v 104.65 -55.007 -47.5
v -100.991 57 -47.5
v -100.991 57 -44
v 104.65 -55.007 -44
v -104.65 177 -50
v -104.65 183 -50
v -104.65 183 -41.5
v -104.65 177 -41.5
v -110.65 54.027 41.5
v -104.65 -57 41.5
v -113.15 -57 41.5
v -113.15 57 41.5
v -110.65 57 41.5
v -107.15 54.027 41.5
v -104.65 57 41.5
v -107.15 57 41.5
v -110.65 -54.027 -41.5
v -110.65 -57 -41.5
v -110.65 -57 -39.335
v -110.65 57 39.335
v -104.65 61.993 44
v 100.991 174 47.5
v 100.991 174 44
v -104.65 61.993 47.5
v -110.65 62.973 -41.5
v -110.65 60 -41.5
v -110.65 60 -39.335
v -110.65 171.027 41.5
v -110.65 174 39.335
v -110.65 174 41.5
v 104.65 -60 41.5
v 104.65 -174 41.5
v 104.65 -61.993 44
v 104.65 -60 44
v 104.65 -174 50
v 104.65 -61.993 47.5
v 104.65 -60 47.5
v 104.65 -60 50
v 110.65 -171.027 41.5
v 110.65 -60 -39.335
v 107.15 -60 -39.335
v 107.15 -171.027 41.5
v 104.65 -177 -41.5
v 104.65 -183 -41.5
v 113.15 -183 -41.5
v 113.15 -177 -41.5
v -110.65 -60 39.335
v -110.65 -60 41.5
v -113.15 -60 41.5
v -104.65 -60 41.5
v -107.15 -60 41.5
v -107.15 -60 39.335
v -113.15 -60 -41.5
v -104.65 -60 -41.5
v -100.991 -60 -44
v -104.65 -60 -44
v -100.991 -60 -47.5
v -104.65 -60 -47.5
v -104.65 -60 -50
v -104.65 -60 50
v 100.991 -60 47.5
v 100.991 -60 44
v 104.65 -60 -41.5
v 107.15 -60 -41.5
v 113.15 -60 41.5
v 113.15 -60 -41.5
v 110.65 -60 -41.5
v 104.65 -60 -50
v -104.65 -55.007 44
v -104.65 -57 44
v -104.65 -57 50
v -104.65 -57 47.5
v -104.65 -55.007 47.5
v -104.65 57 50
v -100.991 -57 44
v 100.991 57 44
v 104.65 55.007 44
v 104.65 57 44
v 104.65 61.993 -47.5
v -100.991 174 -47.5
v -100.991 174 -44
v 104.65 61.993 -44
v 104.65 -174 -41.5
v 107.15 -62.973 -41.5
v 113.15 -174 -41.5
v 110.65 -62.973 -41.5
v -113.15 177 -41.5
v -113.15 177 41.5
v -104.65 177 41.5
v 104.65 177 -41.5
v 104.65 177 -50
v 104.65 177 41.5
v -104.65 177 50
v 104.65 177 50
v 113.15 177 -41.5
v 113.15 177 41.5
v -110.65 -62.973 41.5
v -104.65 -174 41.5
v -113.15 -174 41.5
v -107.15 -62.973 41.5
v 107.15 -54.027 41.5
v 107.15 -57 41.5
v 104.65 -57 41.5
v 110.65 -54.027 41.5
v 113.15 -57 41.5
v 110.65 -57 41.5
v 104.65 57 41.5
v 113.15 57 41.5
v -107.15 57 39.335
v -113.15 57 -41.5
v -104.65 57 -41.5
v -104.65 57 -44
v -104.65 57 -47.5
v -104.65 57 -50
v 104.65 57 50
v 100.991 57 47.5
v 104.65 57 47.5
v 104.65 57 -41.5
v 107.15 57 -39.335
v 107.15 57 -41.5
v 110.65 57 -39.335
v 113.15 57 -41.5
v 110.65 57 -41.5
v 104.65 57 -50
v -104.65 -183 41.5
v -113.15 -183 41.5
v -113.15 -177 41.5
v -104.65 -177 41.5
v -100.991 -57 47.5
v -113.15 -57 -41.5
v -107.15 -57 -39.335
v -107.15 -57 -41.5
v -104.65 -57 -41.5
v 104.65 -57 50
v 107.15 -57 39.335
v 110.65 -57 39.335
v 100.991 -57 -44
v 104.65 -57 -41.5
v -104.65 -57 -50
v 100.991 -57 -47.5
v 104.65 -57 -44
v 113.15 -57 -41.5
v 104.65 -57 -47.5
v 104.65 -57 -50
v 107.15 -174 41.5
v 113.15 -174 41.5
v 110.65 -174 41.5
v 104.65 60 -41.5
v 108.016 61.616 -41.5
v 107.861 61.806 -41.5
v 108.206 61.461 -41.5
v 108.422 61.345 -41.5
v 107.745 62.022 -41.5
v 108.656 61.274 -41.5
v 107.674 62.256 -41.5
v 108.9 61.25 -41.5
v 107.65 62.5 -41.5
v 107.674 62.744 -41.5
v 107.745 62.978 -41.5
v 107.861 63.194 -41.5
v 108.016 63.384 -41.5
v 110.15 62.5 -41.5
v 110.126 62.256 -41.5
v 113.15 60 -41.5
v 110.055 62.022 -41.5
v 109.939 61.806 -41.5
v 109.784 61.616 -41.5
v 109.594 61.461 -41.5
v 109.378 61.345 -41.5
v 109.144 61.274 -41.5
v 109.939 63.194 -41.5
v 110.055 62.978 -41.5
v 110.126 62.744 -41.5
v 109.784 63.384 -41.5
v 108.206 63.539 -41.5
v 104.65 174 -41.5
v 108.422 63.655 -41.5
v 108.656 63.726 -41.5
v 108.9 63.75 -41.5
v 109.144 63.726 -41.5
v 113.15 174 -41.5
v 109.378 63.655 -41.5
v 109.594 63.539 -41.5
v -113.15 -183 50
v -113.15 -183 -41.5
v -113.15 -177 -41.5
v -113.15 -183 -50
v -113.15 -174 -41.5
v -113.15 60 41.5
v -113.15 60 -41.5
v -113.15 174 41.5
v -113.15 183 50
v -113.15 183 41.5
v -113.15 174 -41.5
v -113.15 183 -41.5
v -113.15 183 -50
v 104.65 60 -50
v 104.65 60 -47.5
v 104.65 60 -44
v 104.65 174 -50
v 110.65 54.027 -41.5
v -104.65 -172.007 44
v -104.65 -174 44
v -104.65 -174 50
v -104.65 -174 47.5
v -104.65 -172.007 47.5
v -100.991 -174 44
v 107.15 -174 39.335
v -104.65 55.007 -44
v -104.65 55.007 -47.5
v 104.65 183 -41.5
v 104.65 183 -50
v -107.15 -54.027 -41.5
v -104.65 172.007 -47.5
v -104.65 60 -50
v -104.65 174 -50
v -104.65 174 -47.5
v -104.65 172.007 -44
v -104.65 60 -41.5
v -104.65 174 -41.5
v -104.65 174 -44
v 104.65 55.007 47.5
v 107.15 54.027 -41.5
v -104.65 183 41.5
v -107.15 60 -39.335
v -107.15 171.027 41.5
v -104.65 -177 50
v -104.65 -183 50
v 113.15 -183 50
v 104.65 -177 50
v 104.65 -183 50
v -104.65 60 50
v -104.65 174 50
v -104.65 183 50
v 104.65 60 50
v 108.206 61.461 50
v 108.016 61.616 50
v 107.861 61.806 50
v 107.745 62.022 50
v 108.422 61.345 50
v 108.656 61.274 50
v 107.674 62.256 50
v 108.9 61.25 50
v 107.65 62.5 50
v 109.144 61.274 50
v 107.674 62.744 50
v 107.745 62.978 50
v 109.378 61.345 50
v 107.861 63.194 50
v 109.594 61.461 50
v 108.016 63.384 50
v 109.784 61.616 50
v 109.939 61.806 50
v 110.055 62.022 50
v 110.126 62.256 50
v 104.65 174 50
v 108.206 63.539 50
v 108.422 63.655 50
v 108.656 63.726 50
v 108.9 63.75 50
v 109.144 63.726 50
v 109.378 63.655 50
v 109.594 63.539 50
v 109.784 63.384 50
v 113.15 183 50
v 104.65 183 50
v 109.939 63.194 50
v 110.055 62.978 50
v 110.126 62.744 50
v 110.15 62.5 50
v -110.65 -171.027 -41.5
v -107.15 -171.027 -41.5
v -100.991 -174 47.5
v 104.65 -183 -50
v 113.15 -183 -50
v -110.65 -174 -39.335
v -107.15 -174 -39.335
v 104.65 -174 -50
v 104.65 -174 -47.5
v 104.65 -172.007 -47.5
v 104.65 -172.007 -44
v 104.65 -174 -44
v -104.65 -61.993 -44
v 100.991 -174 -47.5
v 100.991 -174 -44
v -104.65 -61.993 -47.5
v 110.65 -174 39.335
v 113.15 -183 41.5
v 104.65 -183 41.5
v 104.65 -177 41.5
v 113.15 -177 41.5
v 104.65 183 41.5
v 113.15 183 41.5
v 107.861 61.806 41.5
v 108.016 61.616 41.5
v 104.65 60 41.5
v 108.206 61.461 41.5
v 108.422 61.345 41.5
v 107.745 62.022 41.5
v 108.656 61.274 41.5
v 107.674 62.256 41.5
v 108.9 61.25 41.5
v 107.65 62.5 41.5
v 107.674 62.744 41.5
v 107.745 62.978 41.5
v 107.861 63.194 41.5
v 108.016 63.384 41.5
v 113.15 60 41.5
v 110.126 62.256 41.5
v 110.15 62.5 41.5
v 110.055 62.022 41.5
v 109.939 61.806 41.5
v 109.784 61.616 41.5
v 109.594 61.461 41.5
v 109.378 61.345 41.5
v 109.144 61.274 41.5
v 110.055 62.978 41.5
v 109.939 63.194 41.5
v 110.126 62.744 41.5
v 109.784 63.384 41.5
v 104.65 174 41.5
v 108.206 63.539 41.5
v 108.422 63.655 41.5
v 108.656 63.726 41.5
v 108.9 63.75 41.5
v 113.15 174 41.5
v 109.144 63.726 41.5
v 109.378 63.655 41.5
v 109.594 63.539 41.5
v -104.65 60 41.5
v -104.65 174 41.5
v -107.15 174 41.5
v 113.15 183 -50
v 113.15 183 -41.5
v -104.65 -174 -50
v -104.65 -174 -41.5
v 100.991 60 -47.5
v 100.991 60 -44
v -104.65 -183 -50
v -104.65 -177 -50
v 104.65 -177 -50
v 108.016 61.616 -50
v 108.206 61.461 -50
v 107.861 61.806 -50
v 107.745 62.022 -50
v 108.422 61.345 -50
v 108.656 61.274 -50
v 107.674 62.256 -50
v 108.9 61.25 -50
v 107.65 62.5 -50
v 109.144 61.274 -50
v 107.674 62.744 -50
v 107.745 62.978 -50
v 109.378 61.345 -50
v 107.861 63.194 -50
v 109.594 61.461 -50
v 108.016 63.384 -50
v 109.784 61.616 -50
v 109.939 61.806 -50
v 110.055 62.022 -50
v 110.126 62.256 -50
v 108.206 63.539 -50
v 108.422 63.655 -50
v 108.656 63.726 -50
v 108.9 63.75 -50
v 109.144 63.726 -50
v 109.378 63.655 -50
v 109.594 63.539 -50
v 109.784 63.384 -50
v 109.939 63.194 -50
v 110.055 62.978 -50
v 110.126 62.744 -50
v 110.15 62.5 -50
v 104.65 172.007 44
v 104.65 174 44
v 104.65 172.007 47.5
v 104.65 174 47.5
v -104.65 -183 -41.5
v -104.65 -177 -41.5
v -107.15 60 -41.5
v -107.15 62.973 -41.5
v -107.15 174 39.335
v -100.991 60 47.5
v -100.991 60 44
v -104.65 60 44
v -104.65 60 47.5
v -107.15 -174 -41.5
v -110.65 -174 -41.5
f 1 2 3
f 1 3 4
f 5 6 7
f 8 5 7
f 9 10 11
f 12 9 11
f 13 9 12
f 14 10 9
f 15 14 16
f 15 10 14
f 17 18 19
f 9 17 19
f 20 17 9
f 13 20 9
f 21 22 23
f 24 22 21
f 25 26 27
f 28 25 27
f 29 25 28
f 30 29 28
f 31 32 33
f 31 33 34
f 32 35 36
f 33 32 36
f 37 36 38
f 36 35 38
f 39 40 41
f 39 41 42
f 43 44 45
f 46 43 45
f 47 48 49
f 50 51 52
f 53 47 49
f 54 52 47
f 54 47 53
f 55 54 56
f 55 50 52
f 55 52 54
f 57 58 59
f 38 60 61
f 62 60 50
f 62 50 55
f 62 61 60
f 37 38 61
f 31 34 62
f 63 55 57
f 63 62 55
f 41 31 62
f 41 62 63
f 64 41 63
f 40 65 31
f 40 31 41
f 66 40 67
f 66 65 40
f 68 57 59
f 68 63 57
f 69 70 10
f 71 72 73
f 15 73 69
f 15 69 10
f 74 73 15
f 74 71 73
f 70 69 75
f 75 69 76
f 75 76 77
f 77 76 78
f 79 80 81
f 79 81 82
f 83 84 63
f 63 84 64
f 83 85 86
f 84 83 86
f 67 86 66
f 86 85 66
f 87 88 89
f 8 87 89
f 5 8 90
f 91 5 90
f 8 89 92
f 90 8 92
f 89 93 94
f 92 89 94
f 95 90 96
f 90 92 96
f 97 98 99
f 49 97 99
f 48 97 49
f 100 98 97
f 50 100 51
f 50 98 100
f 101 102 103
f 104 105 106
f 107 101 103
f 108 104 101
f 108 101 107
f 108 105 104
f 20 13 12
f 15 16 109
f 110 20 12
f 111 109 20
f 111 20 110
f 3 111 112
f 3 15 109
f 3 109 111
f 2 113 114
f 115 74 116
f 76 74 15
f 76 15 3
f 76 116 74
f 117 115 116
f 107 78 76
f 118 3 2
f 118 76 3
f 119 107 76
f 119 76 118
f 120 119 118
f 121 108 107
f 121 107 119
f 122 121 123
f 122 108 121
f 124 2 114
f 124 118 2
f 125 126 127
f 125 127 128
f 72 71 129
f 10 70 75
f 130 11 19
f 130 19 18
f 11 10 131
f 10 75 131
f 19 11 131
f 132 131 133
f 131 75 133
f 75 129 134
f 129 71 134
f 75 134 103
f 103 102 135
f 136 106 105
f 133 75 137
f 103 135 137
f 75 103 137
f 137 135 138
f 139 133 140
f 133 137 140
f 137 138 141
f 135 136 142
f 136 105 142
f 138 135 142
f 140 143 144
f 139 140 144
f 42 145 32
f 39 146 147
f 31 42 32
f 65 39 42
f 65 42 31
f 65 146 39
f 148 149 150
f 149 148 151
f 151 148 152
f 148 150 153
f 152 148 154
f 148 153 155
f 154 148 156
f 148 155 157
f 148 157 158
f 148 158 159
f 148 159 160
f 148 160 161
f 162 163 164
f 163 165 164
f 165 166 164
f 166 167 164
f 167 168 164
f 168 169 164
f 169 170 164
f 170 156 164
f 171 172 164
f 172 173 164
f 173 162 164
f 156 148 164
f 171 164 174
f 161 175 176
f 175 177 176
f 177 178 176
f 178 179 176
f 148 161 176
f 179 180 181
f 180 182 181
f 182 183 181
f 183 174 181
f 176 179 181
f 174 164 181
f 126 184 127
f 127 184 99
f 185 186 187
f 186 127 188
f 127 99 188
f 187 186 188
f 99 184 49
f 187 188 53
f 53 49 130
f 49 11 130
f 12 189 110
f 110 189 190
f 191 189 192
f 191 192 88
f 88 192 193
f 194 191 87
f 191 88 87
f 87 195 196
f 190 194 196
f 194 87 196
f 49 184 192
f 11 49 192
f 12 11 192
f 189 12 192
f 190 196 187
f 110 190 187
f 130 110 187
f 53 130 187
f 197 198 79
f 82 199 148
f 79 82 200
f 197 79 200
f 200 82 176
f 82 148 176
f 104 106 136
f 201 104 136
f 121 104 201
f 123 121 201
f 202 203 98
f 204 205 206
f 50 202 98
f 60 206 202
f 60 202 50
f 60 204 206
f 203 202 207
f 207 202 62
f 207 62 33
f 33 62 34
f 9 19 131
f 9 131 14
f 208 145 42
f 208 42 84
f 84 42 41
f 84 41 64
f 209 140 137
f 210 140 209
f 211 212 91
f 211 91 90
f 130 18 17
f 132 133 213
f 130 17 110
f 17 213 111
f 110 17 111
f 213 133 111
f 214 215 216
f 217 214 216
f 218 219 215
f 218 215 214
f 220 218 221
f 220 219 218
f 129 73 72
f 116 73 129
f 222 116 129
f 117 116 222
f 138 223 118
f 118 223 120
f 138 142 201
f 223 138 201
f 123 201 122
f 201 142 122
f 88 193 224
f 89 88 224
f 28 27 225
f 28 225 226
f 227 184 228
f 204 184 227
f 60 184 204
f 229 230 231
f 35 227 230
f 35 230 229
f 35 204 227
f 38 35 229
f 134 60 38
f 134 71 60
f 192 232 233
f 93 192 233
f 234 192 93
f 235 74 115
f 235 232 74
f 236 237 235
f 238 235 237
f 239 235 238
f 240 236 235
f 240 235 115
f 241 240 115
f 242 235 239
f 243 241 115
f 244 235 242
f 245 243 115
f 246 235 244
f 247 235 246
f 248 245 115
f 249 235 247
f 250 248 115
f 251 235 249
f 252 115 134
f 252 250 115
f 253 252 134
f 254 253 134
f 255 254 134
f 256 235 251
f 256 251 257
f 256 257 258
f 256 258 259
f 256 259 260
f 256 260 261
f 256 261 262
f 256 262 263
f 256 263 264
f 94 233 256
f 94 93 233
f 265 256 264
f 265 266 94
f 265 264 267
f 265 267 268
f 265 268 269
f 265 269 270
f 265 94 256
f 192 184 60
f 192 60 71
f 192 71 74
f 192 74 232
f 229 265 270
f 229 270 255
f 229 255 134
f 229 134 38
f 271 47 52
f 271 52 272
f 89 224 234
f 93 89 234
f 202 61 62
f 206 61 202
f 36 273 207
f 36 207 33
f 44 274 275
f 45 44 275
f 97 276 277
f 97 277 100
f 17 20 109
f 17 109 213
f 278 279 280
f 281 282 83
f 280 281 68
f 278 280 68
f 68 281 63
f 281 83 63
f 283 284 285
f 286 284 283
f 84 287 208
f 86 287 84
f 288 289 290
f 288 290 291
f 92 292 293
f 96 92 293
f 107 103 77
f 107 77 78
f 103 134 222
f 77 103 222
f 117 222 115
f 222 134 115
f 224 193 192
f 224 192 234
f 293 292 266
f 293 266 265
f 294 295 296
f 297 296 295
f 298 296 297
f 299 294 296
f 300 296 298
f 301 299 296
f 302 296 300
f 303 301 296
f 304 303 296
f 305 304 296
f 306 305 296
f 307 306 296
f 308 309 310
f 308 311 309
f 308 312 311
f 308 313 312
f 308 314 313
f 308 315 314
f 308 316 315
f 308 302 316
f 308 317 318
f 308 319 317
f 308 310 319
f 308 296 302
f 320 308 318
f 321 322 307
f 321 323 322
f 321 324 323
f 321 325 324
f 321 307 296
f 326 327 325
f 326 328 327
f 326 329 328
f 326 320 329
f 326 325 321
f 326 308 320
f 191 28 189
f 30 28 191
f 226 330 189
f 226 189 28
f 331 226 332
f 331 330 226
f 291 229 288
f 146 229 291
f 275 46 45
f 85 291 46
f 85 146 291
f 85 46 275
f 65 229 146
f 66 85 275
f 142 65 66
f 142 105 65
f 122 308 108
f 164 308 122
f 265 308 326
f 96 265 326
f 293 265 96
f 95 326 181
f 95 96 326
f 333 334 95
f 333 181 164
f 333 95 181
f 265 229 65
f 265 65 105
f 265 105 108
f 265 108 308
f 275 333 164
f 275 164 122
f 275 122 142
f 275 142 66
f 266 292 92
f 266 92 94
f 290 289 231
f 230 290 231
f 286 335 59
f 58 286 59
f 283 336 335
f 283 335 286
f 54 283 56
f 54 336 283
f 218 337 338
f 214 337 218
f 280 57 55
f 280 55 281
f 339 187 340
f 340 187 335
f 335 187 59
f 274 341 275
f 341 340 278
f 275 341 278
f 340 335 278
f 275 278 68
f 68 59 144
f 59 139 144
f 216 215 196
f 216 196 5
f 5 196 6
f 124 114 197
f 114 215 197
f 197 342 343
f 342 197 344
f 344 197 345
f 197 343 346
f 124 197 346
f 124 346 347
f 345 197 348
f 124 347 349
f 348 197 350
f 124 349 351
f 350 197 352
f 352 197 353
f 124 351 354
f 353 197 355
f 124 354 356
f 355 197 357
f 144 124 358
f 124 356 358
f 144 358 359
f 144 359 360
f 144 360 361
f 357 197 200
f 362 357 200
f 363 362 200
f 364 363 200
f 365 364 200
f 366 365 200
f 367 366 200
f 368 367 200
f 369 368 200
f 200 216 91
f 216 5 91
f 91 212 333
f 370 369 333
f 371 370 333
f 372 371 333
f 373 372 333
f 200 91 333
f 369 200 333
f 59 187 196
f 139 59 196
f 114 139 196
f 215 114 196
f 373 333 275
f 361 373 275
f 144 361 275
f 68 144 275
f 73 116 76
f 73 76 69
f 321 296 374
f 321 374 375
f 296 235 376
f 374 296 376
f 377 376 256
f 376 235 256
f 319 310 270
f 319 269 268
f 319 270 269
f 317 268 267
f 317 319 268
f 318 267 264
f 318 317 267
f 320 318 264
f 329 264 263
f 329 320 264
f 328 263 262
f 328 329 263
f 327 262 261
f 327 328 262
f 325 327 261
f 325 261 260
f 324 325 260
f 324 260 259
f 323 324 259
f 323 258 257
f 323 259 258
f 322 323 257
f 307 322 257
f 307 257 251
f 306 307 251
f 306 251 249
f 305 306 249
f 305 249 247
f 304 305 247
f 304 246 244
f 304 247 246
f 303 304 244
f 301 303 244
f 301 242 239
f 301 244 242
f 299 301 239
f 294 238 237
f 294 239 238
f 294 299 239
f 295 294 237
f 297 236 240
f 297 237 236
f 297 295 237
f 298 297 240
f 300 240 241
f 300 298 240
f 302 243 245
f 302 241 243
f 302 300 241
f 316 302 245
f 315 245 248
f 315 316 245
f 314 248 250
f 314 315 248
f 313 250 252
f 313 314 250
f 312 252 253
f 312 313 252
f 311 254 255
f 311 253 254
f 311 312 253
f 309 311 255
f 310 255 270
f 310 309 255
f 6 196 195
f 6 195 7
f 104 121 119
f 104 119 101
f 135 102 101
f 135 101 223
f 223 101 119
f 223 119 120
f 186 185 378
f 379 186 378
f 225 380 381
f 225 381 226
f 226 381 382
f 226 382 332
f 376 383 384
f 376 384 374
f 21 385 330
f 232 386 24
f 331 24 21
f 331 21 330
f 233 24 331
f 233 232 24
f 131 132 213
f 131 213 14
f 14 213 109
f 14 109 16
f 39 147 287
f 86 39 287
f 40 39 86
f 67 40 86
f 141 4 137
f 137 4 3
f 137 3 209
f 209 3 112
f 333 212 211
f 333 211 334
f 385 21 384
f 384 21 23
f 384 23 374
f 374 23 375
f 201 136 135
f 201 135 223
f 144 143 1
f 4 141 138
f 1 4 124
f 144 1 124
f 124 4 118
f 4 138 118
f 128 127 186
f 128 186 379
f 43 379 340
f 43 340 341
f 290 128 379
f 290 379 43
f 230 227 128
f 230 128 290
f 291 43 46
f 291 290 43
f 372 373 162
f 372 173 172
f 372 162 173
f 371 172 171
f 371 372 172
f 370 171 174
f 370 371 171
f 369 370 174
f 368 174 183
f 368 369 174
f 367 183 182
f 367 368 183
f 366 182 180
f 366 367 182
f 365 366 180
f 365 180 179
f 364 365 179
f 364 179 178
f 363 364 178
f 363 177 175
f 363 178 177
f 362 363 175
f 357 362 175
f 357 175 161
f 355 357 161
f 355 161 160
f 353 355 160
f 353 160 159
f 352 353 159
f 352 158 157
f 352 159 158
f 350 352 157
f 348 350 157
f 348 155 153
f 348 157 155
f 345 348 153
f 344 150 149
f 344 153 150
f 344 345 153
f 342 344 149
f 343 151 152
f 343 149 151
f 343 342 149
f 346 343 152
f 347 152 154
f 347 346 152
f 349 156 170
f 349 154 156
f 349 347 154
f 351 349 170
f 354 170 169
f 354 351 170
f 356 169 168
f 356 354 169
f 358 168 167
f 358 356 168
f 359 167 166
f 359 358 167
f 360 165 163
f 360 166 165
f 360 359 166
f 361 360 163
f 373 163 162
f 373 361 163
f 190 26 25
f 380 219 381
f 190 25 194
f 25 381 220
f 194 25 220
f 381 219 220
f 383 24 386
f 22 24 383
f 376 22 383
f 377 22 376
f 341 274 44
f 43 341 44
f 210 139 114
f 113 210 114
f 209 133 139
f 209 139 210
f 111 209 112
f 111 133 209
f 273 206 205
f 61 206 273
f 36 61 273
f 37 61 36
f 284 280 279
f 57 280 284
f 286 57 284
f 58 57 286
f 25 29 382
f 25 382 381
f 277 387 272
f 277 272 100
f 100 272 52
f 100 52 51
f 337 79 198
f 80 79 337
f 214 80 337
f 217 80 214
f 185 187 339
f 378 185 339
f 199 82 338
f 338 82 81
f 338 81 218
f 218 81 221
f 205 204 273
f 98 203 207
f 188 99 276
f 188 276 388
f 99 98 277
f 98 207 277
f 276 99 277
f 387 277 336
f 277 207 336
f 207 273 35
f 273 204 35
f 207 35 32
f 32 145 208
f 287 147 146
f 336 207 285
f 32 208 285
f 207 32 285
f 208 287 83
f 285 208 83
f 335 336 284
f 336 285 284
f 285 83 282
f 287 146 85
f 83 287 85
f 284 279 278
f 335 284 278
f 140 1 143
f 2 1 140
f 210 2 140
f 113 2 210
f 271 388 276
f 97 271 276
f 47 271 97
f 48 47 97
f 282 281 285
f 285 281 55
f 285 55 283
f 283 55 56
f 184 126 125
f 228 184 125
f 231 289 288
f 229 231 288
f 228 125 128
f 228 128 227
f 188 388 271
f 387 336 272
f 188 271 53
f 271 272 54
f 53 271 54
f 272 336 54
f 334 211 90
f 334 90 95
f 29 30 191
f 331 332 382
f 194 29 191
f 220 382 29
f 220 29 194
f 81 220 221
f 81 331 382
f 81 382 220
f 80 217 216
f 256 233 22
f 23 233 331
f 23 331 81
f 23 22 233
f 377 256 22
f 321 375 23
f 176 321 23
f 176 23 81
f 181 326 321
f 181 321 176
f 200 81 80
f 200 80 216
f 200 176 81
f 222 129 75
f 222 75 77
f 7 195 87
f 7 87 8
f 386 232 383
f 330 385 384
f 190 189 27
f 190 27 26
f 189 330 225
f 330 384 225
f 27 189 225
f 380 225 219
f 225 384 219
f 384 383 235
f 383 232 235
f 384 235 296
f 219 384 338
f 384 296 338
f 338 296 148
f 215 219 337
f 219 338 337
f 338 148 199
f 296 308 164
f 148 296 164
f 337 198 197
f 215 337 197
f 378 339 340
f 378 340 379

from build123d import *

# Parameters (mm, degrees)
SKETCH2_W               = 226.3
SKETCH2_H               = 100
BOSS_EXTRUDE1_DEPTH     = 183
SKETCH4_OUTSIDE_W       = 316.656
SKETCH4_OUTSIDE_H       = 190.356
SKETCH4_OUTSIDE_W_2     = 8.5
SKETCH4_OUTSIDE_H_2     = 8.5
CUT_EXTRUDE1_DEPTH      = 6
SKETCH5_W               = 209.3
SKETCH5_H               = 114
CUT_EXTRUDE2_DEPTH      = 238.259188442
SKETCH6_W               = 83
SKETCH6_H               = 114
CUT_EXTRUDE3_DEPTH      = 296.29762952
EXTRUDE_THIN1_START     = -2.5
EXTRUDE_THIN1_DEPTH     = 3.5
EXTRUDE_THIN2_START     = -2.5
EXTRUDE_THIN2_DEPTH     = 3.5
CIRPATTERN1_COUNT       = 2
DELETEFACE2_START       = 107.15
DELETEFACE2_DEPTH       = 3.5
CUT_EXTRUDE4_DEPTH      = 221.888937025
CUT_EXTRUDE4_DEPTH_BACK = 221.888937025
SKETCH9_R               = 1.25


# Read off the part's stored shape, not the designer's step: DeleteFace2
with BuildPart() as part:
    # Sketch2 → Boss-Extrude1 (new, symmetric)
    with BuildSketch(Plane(origin=(0, 0, 0), x_dir=(1, 0, 0), z_dir=(0, 1, 0))):
        Rectangle(SKETCH2_W, SKETCH2_H)
    extrude(amount=BOSS_EXTRUDE1_DEPTH, both=True)

    # Sketch4 outside → Cut-Extrude1 (cut)
    with BuildSketch(Plane.XZ.offset(183)):
        Rectangle(SKETCH4_OUTSIDE_W, SKETCH4_OUTSIDE_H)
        with Locations((-108.9, 45.75)):
            Rectangle(SKETCH4_OUTSIDE_W_2, SKETCH4_OUTSIDE_H_2, mode=Mode.SUBTRACT)
        with Locations((-108.9, -45.75)):
            Rectangle(SKETCH4_OUTSIDE_W_2, SKETCH4_OUTSIDE_H_2, mode=Mode.SUBTRACT)
        with Locations((108.9, -45.75)):
            Rectangle(SKETCH4_OUTSIDE_W_2, SKETCH4_OUTSIDE_H_2, mode=Mode.SUBTRACT)
        with Locations((108.9, 45.75)):
            Rectangle(SKETCH4_OUTSIDE_W_2, SKETCH4_OUTSIDE_H_2, mode=Mode.SUBTRACT)
    cut_extrude1 = extrude(amount=-CUT_EXTRUDE1_DEPTH, mode=Mode.SUBTRACT)

    # Mirror1: Cut-Extrude1 across plane
    add(cut_extrude1.mirror(Plane.ZX), mode=Mode.SUBTRACT)

    # Sketch5 → Cut-Extrude2 (cut, through all)
    with BuildSketch(Plane.XY.offset(50)):
        with Locations((0, 117)):
            Rectangle(SKETCH5_W, SKETCH5_H)
        with Locations((0, -117)):
            Rectangle(SKETCH5_W, SKETCH5_H)
        Rectangle(SKETCH5_W, SKETCH5_H)
    extrude(amount=-CUT_EXTRUDE2_DEPTH, mode=Mode.SUBTRACT)

    # Sketch6 → Cut-Extrude3 (cut, through all)
    with BuildSketch(Plane(origin=(113.15, 0, 0), x_dir=(0, 0, -1), z_dir=(1, 0, 0))):
        with Locations((0, 117)):
            Rectangle(SKETCH6_W, SKETCH6_H)
        with Locations((0, -117)):
            Rectangle(SKETCH6_W, SKETCH6_H)
        Rectangle(SKETCH6_W, SKETCH6_H)
    extrude(amount=-CUT_EXTRUDE3_DEPTH, mode=Mode.SUBTRACT)

    # Sketch7 → Extrude-Thin1 (add)
    with BuildSketch(Plane.XY.offset(50).offset(EXTRUDE_THIN1_START)):
        Polygon((-103.812934943, -175.536822075), (105.487065057, -61.536822075), (103.812934943, -58.463177925), (-105.487065057, -172.463177925), align=None)
        Polygon((-103.812934943, -58.536822075), (105.487065057, 55.463177925), (103.812934943, 58.536822075), (-105.487065057, -55.463177925), align=None)
        Polygon((-103.812934943, 58.463177925), (105.487065057, 172.463177925), (103.812934943, 175.536822075), (-105.487065057, 61.536822075), align=None)
    extrude_thin1 = extrude(amount=-EXTRUDE_THIN1_DEPTH)

    # Sketch8 → Extrude-Thin2 (add)
    with BuildSketch(Plane(origin=(113.15, 0, 0), x_dir=(0, 0, -1), z_dir=(1, 0, 0)).offset(EXTRUDE_THIN2_START)):
        Polygon((-40.085248698, -175.030038229), (42.914751302, -61.030038229), (40.085248698, -58.969961771), (-42.914751302, -172.969961771), align=None)
        Polygon((-40.085248698, -58.030038229), (42.914751302, 55.969961771), (40.085248698, 58.030038229), (-42.914751302, -55.969961771), align=None)
        Polygon((-40.085248698, 58.969961771), (42.914751302, 172.969961771), (40.085248698, 175.030038229), (-42.914751302, 61.030038229), align=None)
    extrude_thin2 = extrude(amount=-EXTRUDE_THIN2_DEPTH)

    # CirPattern1: Extrude-Thin1, Extrude-Thin2 ×2 about axis
    cirpattern1_axis = Axis((0, 0, 0), (0, 1, 0))
    add([extrude_thin1.rotate(cirpattern1_axis, i * 360 / CIRPATTERN1_COUNT) for i in range(1, CIRPATTERN1_COUNT)])
    add([extrude_thin2.rotate(cirpattern1_axis, i * 360 / CIRPATTERN1_COUNT) for i in range(1, CIRPATTERN1_COUNT)])

    # DeleteFace2 outline → DeleteFace2 (cut)
    with BuildSketch(Plane.YZ.offset(DELETEFACE2_START)):
        Polygon((60, 41.5), (60, 39.335308584), (171.02680938, -41.5), (174, -41.5), (174, -39.335308584), (62.97319062, 41.5), align=None)
    extrude(amount=DELETEFACE2_DEPTH, mode=Mode.SUBTRACT)

    # Sketch9 → Cut-Extrude4 (cut, two sides: drawn at the far end of the back side and taken through both)
    with BuildSketch(Plane.XY.offset(-CUT_EXTRUDE4_DEPTH_BACK)):
        with Locations((108.9, 62.5)):
            Circle(SKETCH9_R)
    extrude(amount=CUT_EXTRUDE4_DEPTH + CUT_EXTRUDE4_DEPTH_BACK, mode=Mode.SUBTRACT)


solid = part.part
